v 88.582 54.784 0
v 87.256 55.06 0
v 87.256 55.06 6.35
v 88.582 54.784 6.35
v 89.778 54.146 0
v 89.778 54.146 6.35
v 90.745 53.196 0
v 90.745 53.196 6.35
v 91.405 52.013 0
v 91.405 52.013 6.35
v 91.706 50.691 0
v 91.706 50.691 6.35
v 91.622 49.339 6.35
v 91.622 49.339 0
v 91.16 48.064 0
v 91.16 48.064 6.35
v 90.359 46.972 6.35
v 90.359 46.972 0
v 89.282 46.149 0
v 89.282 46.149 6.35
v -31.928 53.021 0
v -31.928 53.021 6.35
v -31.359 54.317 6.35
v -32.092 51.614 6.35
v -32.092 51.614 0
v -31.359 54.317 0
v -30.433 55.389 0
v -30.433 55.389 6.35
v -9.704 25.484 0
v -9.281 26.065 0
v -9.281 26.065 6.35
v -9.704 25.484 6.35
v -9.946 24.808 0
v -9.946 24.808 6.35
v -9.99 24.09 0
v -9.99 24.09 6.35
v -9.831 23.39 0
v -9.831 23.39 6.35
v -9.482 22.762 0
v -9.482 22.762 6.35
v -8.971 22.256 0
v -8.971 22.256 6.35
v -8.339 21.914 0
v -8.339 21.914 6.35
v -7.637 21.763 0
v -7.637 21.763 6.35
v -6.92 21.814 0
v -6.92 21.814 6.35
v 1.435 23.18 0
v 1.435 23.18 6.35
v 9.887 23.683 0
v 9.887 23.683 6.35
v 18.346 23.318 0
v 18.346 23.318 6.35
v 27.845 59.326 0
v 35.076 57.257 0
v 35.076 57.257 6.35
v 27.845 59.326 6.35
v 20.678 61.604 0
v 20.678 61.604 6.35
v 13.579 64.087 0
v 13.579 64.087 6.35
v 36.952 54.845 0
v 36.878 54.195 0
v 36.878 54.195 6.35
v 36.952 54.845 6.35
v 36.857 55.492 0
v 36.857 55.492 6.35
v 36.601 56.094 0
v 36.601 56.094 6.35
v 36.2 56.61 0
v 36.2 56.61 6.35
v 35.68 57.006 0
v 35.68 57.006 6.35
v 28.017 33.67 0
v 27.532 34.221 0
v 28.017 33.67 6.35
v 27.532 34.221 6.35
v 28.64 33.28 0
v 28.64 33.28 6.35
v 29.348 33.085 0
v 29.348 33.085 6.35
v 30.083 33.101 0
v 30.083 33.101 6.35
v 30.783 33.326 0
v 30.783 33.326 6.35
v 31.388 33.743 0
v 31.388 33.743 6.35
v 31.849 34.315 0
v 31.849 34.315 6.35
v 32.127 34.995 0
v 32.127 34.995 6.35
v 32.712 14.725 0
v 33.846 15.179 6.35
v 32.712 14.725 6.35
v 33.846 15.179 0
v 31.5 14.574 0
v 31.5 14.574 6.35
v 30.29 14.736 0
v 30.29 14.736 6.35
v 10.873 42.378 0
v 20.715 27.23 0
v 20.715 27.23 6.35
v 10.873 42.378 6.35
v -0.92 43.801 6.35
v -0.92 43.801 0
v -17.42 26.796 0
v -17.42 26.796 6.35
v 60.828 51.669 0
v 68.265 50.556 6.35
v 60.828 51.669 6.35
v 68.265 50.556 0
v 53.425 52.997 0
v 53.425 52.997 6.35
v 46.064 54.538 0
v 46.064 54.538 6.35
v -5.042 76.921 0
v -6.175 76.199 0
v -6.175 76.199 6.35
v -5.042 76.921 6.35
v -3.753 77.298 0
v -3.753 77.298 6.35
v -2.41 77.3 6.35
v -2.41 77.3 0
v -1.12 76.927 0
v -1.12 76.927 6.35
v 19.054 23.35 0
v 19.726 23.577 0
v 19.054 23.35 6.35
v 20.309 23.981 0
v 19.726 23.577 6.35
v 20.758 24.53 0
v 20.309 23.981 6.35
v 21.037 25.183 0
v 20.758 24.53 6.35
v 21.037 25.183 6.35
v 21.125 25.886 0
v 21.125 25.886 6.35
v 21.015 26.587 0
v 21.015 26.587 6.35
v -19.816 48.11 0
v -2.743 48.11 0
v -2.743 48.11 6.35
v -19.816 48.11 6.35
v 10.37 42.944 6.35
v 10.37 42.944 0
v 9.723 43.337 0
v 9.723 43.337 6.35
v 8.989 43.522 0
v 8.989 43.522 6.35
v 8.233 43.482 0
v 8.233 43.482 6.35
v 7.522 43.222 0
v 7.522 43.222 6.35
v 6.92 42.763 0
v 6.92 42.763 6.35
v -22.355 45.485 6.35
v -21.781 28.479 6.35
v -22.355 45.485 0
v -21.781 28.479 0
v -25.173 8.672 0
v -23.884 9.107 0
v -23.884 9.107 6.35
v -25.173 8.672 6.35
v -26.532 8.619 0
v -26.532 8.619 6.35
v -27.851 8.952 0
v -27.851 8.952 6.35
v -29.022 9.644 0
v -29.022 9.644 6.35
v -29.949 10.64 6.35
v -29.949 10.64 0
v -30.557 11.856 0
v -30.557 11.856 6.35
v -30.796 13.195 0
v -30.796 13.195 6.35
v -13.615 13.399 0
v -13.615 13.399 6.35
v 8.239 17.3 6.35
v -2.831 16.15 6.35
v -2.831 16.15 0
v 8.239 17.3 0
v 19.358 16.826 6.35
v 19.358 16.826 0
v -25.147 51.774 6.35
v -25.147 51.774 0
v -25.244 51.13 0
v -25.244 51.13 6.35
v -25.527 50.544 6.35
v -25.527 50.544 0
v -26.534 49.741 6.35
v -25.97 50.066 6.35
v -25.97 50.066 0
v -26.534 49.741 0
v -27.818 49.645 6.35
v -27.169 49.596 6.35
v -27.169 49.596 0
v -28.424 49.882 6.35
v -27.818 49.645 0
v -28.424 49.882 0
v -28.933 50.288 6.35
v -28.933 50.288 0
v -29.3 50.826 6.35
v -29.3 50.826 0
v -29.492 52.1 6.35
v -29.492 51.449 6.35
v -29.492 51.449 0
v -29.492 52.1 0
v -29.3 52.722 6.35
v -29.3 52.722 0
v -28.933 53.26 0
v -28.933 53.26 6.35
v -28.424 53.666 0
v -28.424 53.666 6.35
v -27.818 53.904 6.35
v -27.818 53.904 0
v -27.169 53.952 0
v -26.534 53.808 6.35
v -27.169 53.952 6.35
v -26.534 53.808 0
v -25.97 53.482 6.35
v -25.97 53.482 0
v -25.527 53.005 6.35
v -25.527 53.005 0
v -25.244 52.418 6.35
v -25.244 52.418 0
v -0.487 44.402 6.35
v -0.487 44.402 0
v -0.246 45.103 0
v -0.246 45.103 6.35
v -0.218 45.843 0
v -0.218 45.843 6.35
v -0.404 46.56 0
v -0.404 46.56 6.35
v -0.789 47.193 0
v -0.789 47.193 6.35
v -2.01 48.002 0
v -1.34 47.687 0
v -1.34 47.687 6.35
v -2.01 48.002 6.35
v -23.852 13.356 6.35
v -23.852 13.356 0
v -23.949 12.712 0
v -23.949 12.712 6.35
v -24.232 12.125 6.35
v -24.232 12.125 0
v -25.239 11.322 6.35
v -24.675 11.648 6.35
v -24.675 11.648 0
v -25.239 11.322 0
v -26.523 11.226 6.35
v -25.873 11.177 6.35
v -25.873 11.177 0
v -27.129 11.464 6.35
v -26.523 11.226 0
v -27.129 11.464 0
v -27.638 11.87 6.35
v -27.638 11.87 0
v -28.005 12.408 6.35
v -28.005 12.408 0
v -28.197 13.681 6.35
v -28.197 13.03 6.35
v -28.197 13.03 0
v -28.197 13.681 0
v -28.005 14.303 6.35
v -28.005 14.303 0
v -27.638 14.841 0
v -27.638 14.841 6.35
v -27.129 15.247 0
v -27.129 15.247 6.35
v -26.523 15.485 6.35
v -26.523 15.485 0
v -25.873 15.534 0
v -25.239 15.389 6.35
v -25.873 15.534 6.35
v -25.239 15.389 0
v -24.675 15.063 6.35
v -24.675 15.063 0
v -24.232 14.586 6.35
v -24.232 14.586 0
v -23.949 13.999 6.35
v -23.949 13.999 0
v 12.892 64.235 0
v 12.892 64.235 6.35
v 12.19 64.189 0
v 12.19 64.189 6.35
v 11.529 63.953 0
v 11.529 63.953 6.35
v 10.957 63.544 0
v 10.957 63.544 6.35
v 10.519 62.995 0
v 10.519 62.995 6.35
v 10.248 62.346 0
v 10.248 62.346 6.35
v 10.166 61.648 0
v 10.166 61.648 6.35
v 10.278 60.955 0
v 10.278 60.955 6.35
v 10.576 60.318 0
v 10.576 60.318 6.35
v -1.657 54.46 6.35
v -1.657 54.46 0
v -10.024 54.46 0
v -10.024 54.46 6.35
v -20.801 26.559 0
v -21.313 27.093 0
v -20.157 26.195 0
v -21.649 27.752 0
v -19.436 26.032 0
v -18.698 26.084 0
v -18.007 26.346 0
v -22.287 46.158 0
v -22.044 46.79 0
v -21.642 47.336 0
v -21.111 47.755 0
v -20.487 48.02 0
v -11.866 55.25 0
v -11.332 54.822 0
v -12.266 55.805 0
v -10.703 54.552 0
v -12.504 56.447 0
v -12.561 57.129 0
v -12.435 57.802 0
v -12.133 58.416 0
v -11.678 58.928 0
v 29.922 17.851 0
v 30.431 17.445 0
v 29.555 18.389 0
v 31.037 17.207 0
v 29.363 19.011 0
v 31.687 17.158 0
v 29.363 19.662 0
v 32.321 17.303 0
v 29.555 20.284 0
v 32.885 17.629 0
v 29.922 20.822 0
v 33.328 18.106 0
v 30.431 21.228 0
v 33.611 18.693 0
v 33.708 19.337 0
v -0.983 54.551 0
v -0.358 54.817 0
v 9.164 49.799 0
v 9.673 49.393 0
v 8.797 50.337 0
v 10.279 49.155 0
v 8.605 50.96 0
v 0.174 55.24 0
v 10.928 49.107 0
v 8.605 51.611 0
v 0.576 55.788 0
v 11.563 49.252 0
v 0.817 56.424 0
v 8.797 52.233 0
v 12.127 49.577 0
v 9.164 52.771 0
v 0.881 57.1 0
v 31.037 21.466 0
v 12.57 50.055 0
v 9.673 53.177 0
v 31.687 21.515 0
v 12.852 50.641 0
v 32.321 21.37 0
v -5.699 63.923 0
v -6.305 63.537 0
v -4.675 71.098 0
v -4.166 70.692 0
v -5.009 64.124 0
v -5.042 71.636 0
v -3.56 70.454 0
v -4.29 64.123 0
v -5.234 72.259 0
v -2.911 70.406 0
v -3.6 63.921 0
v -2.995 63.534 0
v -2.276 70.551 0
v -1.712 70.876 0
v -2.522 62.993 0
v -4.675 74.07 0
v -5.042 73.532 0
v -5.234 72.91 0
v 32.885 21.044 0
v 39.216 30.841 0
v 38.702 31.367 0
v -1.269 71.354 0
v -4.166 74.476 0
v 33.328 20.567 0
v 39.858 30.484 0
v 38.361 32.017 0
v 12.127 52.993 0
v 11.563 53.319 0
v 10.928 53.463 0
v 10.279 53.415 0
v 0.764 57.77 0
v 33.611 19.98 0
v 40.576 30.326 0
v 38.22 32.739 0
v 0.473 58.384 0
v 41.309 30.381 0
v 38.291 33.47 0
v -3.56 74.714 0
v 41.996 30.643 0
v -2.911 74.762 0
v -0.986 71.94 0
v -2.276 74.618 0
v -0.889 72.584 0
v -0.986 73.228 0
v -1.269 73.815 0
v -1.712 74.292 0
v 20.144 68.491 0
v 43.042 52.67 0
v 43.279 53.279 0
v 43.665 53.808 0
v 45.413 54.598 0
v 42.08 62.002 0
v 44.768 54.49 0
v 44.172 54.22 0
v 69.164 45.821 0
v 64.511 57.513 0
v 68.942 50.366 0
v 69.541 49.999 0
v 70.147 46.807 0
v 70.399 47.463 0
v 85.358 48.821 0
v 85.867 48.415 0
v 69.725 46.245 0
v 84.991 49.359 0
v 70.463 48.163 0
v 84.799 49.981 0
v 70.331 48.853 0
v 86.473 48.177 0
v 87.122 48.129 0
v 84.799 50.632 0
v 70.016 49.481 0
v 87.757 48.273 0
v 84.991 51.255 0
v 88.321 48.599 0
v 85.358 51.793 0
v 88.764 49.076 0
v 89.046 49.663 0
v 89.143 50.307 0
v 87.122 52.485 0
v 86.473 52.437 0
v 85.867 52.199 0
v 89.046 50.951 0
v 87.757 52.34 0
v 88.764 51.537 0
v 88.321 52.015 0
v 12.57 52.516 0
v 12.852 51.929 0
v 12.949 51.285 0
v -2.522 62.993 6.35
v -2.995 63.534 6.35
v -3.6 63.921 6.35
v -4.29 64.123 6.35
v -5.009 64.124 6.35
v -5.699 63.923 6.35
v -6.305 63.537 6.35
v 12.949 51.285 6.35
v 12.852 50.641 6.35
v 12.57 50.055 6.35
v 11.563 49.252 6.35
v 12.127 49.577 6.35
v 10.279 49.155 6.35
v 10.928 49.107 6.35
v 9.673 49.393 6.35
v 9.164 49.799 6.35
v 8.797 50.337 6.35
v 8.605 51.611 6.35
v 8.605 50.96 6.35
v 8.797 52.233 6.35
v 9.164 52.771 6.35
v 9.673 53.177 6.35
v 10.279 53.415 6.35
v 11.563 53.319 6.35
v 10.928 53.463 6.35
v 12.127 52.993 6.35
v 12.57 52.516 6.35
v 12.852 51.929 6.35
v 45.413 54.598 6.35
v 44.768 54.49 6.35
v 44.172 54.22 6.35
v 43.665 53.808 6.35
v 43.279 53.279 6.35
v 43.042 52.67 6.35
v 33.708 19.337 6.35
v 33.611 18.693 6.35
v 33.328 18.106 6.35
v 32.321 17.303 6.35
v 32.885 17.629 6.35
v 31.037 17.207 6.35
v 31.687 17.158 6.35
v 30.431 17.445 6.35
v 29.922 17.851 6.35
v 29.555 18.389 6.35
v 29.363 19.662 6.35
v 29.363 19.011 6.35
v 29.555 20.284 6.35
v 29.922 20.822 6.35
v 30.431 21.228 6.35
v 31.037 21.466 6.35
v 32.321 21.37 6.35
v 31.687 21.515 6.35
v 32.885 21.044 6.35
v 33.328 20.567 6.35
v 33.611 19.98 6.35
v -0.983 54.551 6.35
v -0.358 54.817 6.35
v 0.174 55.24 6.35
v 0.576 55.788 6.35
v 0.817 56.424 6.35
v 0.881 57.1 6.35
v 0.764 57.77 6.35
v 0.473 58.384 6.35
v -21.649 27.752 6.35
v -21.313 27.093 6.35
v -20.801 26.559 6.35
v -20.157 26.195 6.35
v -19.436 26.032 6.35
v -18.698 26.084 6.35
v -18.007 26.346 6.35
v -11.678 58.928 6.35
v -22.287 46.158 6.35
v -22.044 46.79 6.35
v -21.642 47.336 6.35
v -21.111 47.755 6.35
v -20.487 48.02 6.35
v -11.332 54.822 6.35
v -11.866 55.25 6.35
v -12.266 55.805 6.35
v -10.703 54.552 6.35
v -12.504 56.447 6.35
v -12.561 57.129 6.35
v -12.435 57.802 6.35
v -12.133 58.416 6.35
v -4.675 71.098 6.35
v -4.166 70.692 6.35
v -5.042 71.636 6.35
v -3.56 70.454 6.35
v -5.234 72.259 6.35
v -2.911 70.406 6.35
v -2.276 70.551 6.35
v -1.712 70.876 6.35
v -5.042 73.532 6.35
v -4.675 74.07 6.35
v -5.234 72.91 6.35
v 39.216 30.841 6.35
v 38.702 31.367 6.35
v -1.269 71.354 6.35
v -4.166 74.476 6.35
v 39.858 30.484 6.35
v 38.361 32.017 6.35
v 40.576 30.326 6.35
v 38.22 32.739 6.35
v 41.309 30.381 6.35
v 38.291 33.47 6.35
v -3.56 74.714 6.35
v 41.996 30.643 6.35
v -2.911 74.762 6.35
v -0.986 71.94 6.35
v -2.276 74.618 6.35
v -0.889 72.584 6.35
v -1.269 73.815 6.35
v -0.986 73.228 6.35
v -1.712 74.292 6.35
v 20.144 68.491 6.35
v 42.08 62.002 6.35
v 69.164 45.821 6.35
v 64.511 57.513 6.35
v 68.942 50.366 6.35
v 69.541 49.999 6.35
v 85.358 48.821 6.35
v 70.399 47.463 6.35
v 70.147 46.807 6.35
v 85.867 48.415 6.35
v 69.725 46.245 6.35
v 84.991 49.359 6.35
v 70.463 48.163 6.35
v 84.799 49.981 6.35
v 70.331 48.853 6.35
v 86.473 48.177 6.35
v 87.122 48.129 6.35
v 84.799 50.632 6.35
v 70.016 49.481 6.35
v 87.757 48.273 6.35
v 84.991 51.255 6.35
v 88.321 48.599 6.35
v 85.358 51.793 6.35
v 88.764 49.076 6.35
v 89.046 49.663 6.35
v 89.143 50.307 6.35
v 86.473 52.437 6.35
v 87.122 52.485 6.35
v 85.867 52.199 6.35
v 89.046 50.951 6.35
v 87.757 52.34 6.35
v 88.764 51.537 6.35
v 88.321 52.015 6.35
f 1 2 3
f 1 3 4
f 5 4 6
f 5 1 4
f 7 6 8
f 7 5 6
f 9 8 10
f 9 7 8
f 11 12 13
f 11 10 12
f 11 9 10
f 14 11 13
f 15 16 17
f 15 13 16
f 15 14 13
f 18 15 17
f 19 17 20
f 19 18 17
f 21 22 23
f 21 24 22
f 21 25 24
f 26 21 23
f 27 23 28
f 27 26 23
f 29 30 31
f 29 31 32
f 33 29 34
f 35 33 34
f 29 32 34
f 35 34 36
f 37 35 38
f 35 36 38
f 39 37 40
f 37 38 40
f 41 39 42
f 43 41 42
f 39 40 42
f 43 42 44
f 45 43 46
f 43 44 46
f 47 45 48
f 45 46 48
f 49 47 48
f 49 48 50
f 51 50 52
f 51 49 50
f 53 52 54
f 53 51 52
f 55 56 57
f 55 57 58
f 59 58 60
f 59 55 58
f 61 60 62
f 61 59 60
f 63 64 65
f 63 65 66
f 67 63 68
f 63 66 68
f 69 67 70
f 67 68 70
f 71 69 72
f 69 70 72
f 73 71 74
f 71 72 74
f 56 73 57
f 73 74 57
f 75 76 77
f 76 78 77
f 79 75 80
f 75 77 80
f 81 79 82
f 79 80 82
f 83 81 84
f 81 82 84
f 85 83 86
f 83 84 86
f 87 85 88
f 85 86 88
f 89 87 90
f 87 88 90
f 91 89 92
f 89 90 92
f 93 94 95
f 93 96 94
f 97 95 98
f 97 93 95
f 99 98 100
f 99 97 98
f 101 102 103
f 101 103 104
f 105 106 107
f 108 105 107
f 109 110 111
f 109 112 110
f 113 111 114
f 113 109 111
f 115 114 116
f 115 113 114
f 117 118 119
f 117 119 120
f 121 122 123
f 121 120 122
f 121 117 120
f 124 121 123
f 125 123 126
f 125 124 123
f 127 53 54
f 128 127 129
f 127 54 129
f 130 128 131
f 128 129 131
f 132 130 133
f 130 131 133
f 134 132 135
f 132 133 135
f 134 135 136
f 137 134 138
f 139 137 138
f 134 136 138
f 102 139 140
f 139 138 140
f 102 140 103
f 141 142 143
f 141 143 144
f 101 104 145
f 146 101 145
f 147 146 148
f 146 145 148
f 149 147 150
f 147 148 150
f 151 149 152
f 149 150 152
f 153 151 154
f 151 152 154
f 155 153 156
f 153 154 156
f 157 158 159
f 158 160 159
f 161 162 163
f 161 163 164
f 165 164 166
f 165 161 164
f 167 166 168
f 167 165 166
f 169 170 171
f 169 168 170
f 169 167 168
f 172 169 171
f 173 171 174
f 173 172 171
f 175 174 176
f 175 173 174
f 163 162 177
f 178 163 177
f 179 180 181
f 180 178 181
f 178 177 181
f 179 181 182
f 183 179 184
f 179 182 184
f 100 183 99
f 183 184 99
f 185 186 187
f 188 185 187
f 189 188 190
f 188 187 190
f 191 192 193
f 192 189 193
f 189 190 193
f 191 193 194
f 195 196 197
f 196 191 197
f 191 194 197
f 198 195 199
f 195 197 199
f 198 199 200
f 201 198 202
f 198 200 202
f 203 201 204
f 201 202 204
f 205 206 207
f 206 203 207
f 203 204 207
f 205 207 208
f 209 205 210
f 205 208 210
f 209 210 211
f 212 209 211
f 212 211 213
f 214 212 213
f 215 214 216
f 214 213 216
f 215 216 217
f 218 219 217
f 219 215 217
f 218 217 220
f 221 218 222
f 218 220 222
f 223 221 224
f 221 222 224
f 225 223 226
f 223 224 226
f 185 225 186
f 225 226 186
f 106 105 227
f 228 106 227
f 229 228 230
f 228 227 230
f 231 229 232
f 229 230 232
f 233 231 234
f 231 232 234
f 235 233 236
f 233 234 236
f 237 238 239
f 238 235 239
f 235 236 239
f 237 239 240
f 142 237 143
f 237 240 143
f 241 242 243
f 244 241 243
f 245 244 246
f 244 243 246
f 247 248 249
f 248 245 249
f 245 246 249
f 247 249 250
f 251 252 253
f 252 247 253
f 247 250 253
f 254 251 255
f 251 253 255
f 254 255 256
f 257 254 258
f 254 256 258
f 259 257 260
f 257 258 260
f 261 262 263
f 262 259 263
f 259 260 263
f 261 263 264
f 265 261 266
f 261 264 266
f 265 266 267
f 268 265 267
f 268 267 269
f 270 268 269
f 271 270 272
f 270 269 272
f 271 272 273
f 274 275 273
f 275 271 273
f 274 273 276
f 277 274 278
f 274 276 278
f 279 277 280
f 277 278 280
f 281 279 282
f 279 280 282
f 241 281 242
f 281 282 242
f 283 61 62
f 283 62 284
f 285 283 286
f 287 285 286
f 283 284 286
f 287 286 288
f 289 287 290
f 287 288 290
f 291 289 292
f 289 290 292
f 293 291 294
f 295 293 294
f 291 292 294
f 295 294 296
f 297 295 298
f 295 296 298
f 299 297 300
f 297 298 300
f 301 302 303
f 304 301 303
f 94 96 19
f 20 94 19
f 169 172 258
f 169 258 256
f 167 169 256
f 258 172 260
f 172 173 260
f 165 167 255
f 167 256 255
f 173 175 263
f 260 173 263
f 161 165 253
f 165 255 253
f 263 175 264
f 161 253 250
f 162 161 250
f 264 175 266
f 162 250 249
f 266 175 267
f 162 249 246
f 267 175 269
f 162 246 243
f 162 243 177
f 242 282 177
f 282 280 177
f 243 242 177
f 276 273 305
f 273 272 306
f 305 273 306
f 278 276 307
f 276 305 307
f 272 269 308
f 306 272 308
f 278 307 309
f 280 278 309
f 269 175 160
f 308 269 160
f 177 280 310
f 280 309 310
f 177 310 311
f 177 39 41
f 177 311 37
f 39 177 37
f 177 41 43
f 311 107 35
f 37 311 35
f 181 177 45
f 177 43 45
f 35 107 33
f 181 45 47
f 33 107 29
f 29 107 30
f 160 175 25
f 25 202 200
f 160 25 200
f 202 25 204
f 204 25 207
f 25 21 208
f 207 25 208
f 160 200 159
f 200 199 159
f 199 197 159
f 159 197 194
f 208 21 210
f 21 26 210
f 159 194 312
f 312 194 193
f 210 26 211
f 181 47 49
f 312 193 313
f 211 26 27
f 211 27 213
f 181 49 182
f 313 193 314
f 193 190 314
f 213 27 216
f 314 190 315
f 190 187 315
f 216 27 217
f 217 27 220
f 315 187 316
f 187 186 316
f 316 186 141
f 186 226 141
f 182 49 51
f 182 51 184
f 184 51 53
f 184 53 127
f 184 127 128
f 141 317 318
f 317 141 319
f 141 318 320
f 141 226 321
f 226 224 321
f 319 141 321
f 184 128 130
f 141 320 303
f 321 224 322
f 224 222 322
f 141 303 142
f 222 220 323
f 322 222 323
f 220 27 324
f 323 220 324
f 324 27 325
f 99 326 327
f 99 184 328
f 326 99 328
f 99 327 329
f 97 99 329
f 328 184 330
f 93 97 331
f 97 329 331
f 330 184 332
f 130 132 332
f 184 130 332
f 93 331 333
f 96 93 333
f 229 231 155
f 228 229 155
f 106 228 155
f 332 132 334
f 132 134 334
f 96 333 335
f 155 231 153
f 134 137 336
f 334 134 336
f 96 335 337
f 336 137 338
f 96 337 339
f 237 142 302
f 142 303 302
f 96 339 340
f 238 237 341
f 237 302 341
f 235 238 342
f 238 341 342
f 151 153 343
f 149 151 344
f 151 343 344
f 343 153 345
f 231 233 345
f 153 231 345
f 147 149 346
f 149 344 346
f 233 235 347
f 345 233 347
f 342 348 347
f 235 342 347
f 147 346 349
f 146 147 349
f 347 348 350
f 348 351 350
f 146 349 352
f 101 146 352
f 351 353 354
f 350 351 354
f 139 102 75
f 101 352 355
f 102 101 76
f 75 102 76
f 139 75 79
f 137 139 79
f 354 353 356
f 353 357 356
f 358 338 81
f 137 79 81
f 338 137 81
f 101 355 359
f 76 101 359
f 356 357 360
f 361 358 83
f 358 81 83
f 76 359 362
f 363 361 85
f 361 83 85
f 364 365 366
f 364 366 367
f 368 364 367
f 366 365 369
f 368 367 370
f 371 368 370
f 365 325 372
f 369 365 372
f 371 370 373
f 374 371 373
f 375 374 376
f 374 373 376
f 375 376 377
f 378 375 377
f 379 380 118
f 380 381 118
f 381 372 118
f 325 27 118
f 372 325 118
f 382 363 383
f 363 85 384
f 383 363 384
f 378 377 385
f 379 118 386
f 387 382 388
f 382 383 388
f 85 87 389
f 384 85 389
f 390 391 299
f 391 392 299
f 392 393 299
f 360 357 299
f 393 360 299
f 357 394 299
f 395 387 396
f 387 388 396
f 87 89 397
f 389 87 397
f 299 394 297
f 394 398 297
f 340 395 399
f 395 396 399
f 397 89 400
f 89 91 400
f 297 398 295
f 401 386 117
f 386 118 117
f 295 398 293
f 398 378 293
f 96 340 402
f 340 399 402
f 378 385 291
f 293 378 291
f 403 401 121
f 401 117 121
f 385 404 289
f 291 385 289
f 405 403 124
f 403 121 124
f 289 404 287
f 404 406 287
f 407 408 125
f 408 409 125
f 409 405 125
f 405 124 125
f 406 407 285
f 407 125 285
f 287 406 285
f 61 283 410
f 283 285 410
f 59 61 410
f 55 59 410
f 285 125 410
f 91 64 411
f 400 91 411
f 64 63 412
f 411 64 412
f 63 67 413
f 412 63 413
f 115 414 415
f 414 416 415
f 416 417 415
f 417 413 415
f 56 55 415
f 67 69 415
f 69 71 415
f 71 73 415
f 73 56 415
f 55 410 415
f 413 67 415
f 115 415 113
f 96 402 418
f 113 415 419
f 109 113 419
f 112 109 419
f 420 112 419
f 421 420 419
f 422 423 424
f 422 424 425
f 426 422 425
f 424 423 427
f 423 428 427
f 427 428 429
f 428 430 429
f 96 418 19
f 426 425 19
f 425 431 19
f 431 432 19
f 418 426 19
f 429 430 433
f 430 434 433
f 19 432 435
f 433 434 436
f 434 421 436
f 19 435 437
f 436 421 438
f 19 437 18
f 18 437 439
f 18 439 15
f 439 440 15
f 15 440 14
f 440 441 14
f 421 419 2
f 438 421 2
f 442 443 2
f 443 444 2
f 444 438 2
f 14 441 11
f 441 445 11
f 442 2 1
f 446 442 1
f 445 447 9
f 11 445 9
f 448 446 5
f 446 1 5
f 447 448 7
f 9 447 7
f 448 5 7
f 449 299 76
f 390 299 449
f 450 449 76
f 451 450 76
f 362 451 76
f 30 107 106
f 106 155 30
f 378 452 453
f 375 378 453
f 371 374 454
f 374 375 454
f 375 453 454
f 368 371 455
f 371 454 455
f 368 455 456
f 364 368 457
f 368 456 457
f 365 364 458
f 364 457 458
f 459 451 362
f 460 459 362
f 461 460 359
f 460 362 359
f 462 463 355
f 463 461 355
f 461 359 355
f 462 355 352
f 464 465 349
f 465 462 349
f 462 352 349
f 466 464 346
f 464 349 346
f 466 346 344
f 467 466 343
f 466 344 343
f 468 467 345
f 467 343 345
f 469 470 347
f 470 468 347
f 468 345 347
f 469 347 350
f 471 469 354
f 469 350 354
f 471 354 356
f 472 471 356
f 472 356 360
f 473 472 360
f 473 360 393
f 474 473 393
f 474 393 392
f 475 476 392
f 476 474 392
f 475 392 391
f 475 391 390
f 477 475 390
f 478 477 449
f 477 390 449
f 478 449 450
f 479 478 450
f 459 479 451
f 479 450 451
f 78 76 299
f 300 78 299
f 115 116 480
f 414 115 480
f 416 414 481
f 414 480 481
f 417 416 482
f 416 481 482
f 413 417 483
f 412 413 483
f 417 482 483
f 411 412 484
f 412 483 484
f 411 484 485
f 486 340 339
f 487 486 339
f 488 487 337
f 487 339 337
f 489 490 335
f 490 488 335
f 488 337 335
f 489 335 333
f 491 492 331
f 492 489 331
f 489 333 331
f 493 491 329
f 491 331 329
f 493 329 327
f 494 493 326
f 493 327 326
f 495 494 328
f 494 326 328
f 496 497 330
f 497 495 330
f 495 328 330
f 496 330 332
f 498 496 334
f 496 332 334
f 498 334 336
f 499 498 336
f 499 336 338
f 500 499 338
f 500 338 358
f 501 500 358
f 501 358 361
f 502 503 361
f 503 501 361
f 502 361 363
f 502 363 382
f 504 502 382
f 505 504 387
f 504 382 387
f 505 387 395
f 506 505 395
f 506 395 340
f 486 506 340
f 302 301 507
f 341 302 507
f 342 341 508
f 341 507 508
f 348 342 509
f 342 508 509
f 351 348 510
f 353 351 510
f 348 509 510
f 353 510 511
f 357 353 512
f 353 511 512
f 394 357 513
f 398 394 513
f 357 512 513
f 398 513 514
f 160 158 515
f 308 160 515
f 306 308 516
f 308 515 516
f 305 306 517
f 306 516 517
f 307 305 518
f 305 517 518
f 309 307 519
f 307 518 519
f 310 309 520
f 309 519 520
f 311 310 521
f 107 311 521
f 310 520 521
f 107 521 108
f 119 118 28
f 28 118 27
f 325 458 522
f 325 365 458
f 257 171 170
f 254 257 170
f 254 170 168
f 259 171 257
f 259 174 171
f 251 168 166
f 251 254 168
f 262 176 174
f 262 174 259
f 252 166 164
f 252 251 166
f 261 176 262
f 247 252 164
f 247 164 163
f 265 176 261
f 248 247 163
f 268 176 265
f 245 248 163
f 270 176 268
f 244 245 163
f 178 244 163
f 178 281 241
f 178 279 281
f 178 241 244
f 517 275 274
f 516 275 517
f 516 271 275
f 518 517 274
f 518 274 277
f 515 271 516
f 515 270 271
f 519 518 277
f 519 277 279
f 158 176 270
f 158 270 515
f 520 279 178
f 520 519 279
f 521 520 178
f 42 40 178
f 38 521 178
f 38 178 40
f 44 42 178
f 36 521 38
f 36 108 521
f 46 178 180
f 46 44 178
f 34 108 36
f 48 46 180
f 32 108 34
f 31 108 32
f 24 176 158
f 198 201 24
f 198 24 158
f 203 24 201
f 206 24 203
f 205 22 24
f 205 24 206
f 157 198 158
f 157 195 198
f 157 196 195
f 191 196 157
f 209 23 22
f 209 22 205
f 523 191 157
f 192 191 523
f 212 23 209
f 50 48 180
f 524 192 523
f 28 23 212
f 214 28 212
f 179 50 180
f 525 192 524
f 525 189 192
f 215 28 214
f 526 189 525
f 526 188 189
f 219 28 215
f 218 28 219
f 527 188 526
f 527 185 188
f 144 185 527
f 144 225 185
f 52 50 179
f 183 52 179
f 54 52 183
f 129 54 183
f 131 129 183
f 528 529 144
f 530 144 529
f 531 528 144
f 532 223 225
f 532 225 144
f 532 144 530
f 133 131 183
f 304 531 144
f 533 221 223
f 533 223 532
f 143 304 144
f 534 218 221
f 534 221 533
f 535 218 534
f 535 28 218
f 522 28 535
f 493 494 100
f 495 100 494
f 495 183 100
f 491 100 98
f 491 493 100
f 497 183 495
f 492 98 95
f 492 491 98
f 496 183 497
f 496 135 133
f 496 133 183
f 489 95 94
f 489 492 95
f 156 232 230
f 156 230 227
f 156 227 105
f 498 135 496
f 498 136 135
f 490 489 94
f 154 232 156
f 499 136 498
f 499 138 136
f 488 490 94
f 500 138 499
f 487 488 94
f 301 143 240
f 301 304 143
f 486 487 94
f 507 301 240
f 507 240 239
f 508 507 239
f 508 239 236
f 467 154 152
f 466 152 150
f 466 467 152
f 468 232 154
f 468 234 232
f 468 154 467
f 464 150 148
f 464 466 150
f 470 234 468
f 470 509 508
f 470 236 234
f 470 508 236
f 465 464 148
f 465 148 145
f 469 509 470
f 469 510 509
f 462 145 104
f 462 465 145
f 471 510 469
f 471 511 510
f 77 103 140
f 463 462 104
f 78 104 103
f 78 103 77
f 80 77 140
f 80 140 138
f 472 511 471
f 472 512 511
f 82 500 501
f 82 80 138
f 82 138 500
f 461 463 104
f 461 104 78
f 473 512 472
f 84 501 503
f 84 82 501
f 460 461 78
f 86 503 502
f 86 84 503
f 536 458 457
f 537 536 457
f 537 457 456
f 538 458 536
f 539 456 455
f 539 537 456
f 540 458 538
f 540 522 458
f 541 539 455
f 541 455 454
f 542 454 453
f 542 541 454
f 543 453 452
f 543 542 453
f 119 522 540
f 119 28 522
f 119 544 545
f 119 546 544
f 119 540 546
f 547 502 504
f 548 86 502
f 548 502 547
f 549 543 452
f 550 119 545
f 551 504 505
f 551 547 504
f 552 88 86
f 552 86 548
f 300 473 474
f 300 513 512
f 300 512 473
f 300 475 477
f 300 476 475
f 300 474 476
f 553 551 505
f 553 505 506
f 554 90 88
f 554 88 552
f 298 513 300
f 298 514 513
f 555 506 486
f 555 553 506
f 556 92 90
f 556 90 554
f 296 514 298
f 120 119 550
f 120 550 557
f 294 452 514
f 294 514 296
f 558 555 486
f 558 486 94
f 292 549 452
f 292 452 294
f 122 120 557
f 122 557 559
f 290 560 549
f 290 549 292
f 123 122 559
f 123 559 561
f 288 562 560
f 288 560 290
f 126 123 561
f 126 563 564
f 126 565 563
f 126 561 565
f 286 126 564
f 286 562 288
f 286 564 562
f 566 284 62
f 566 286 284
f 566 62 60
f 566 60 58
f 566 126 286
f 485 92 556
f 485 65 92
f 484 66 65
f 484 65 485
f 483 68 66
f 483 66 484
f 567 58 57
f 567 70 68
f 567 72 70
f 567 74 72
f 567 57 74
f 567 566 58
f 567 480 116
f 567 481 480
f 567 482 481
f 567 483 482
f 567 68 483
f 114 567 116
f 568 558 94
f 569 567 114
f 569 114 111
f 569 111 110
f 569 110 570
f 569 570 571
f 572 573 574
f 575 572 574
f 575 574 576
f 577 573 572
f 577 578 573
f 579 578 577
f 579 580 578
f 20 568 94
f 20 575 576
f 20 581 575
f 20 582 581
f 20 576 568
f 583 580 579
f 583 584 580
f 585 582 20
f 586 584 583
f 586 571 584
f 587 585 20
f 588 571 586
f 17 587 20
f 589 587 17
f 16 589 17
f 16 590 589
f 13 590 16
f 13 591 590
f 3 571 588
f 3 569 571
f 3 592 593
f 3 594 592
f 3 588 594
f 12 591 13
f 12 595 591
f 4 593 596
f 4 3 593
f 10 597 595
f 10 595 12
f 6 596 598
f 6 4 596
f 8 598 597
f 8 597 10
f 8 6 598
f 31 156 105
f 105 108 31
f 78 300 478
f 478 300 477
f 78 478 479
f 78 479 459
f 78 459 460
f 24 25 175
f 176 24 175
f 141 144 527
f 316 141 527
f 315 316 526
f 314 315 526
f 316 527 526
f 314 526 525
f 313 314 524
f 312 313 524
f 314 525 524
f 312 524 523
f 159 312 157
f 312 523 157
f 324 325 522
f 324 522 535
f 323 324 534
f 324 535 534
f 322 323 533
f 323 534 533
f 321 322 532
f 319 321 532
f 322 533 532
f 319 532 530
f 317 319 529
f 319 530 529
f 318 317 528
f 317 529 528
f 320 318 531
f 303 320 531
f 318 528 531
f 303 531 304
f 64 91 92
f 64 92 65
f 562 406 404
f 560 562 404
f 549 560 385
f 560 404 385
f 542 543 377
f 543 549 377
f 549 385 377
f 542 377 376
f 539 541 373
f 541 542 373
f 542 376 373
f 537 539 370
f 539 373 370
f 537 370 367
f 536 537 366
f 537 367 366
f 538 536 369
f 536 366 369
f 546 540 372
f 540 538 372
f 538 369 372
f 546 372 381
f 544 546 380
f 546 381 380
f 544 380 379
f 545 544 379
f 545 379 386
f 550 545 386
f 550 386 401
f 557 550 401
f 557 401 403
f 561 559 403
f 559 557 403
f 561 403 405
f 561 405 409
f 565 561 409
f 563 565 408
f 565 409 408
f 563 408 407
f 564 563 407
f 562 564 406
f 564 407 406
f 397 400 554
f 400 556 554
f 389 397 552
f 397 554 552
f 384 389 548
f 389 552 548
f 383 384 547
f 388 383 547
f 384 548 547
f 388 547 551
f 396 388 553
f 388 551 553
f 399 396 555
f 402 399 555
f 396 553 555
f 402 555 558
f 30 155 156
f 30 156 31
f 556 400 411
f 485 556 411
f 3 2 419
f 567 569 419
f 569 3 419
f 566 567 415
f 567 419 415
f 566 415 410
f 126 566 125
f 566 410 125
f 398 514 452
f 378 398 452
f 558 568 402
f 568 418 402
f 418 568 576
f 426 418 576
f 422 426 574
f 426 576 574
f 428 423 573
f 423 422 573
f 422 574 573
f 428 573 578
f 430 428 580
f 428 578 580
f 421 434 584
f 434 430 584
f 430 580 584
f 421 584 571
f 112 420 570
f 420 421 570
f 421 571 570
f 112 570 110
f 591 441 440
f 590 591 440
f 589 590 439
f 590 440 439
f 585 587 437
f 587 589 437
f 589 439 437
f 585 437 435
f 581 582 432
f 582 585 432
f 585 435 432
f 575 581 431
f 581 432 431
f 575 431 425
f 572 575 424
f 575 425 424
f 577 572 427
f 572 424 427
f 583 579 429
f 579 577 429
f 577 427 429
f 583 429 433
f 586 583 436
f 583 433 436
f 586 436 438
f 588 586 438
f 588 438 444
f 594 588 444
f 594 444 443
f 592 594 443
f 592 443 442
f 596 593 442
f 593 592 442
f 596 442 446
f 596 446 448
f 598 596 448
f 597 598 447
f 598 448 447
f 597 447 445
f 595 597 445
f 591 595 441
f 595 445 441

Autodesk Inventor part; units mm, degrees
ref_plane "YZ Plane" through (0, 0, 0) normal (1, 0, 0) x (0, 1, 0)
ref_plane "XZ Plane" through (0, 0, 0) normal (0, 1, 0) x (-1, 0, 0)
ref_plane "XY Plane" through (0, 0, 0) normal (0, 0, 1) x (1, 0, 0)
sketch "Sketch1" plane through (0, 0, 0) normal (0, 0, 1) x (1, 0, 0)
  circle A0 centre (10.765, 51.2851) radius 2.1844 projected
  circle A1 centre (31.5233, 19.3366) radius 2.1844 projected
  circle A2 centre (86.9588, 50.3069) radius 2.1844 projected
  circle A3 centre (-3.0738, 72.5841) radius 2.1844 projected
  circle A4 centre (-27.3318, 51.7742) radius 2.1844 projected
  circle A5 centre (-26.0367, 13.3556) radius 2.1844 projected
  arc A6 (30.2901, 14.7365) -> (33.8461, 15.1789) centre (31.5233, 19.3366) ccw
  arc A7 (89.2815, 46.1492) -> (87.0199, 55.069) centre (86.9588, 50.3069) ccw
  arc A8 (-1.1199, 76.9273) -> (-6.1747, 76.1988) centre (-3.0738, 72.5841) ccw
  arc A9 (-30.4327, 55.3889) -> (-32.0916, 51.6137) centre (-27.3318, 51.7742) ccw
  arc A10 (-30.7965, 13.1952) -> (-23.8841, 9.1074) centre (-26.0367, 13.3556) ccw
  line L0 (30.721, 29.3126) -> (6.3194, 66.8684)
  line L1 (-6.1747, 76.1988) -> (-30.4327, 55.3889)
  line L2 (-32.0916, 51.6137) -> (-30.7965, 13.1952)
  line L3 (33.8461, 15.1789) -> (89.2815, 46.1492)
  line L4 (-4.1028, 65.4266) -> (-16.8864, 54.4601)
  line L5 (9.1377, 45.0485) -> (-15.7743, 19.373)
  line L6 (3.2606, 48.1101) -> (-21.58, 22.5083)
  arc A11 (-1.1199, 76.9273) -> (87.2556, 55.0601) centre (103.0888, 308.5662) ccw
  arc A12 (30.2901, 14.7365) -> (-23.8841, 9.1074) centre (10.5583, -58.8644) ccw
  line L7 (3.0226, 54.4601) -> (-16.8864, 54.4601)
  line L8 (3.2606, 48.1101) -> (-22.4431, 48.1101)
  line L9 (75.984, 49.6309) -> (36.8851, 27.7874)
  arc A13 (23.7023, 22.6325) -> (-15.7743, 19.373) centre (10.5583, -58.8644) ccw
  line L10 (-21.58, 22.5083) -> (-22.4431, 48.1101)
  line L11 (23.7023, 22.6325) -> (9.1377, 45.0485)
  line L12 (3.0226, 54.4601) -> (-4.1028, 65.4266)
  line L13 (10.765, 51.2851) -> (-26.0367, 13.3556) construction
  line L14 (31.5233, 19.3366) -> (42.0802, 62.0019) construction
  line L15 (36.8851, 27.7874) -> (43.6417, 55.0939)
  line L16 (30.721, 29.3126) -> (37.4775, 56.6192)
  arc A14 (6.3194, 66.8684) -> (37.4775, 56.6192) centre (103.0888, 308.5662) ccw
  arc A15 (43.6417, 55.0939) -> (75.984, 49.6309) centre (103.0888, 308.5662) ccw
  point P0 (0, 0)
  dimension "d0" = 9.525
  dimension "d1" = 9.525
  dimension "d2" = 9.525
  dimension "d3" = 9.525
  dimension "d5" = 9.525
  dimension "d7" = 254
  dimension "d8" = 76.2
  dimension "d11" = 6.35
  dimension "d12" = 3.175
  dimension "d18" = 3.175
  dimension "d19" = 3.175
  dimension "d20" = 3.175
  dimension "d21" = 3.175
  dimension "d24" = 6.35
extrude "Extrusion1" add sketch "Sketch1" along normal blind 6.35
fillet "Fillet1" radius 2.54 15 edges at (-15.7743, 19.373, 3.175) (9.1377, 45.0485, 3.175) (-4.1028, 65.4266, 3.175) (6.3194, 66.8684, 3.175) (3.2606, 48.1101, 3.175) (3.0226, 54.4601, 3.175) (-22.4431, 48.1101, 3.175) (-21.58, 22.5083, 3.175) (-16.8864, 54.4601, 3.175) (23.7023, 22.6325, 3.175) (75.984, 49.6309, 3.175) (43.6417, 55.0939, 3.175) (37.4775, 56.6192, 3.175) (30.721, 29.3126, 3.175) (36.8851, 27.7874, 3.175)
properties part number "centralbrace" material "Acetal Resin, White"
